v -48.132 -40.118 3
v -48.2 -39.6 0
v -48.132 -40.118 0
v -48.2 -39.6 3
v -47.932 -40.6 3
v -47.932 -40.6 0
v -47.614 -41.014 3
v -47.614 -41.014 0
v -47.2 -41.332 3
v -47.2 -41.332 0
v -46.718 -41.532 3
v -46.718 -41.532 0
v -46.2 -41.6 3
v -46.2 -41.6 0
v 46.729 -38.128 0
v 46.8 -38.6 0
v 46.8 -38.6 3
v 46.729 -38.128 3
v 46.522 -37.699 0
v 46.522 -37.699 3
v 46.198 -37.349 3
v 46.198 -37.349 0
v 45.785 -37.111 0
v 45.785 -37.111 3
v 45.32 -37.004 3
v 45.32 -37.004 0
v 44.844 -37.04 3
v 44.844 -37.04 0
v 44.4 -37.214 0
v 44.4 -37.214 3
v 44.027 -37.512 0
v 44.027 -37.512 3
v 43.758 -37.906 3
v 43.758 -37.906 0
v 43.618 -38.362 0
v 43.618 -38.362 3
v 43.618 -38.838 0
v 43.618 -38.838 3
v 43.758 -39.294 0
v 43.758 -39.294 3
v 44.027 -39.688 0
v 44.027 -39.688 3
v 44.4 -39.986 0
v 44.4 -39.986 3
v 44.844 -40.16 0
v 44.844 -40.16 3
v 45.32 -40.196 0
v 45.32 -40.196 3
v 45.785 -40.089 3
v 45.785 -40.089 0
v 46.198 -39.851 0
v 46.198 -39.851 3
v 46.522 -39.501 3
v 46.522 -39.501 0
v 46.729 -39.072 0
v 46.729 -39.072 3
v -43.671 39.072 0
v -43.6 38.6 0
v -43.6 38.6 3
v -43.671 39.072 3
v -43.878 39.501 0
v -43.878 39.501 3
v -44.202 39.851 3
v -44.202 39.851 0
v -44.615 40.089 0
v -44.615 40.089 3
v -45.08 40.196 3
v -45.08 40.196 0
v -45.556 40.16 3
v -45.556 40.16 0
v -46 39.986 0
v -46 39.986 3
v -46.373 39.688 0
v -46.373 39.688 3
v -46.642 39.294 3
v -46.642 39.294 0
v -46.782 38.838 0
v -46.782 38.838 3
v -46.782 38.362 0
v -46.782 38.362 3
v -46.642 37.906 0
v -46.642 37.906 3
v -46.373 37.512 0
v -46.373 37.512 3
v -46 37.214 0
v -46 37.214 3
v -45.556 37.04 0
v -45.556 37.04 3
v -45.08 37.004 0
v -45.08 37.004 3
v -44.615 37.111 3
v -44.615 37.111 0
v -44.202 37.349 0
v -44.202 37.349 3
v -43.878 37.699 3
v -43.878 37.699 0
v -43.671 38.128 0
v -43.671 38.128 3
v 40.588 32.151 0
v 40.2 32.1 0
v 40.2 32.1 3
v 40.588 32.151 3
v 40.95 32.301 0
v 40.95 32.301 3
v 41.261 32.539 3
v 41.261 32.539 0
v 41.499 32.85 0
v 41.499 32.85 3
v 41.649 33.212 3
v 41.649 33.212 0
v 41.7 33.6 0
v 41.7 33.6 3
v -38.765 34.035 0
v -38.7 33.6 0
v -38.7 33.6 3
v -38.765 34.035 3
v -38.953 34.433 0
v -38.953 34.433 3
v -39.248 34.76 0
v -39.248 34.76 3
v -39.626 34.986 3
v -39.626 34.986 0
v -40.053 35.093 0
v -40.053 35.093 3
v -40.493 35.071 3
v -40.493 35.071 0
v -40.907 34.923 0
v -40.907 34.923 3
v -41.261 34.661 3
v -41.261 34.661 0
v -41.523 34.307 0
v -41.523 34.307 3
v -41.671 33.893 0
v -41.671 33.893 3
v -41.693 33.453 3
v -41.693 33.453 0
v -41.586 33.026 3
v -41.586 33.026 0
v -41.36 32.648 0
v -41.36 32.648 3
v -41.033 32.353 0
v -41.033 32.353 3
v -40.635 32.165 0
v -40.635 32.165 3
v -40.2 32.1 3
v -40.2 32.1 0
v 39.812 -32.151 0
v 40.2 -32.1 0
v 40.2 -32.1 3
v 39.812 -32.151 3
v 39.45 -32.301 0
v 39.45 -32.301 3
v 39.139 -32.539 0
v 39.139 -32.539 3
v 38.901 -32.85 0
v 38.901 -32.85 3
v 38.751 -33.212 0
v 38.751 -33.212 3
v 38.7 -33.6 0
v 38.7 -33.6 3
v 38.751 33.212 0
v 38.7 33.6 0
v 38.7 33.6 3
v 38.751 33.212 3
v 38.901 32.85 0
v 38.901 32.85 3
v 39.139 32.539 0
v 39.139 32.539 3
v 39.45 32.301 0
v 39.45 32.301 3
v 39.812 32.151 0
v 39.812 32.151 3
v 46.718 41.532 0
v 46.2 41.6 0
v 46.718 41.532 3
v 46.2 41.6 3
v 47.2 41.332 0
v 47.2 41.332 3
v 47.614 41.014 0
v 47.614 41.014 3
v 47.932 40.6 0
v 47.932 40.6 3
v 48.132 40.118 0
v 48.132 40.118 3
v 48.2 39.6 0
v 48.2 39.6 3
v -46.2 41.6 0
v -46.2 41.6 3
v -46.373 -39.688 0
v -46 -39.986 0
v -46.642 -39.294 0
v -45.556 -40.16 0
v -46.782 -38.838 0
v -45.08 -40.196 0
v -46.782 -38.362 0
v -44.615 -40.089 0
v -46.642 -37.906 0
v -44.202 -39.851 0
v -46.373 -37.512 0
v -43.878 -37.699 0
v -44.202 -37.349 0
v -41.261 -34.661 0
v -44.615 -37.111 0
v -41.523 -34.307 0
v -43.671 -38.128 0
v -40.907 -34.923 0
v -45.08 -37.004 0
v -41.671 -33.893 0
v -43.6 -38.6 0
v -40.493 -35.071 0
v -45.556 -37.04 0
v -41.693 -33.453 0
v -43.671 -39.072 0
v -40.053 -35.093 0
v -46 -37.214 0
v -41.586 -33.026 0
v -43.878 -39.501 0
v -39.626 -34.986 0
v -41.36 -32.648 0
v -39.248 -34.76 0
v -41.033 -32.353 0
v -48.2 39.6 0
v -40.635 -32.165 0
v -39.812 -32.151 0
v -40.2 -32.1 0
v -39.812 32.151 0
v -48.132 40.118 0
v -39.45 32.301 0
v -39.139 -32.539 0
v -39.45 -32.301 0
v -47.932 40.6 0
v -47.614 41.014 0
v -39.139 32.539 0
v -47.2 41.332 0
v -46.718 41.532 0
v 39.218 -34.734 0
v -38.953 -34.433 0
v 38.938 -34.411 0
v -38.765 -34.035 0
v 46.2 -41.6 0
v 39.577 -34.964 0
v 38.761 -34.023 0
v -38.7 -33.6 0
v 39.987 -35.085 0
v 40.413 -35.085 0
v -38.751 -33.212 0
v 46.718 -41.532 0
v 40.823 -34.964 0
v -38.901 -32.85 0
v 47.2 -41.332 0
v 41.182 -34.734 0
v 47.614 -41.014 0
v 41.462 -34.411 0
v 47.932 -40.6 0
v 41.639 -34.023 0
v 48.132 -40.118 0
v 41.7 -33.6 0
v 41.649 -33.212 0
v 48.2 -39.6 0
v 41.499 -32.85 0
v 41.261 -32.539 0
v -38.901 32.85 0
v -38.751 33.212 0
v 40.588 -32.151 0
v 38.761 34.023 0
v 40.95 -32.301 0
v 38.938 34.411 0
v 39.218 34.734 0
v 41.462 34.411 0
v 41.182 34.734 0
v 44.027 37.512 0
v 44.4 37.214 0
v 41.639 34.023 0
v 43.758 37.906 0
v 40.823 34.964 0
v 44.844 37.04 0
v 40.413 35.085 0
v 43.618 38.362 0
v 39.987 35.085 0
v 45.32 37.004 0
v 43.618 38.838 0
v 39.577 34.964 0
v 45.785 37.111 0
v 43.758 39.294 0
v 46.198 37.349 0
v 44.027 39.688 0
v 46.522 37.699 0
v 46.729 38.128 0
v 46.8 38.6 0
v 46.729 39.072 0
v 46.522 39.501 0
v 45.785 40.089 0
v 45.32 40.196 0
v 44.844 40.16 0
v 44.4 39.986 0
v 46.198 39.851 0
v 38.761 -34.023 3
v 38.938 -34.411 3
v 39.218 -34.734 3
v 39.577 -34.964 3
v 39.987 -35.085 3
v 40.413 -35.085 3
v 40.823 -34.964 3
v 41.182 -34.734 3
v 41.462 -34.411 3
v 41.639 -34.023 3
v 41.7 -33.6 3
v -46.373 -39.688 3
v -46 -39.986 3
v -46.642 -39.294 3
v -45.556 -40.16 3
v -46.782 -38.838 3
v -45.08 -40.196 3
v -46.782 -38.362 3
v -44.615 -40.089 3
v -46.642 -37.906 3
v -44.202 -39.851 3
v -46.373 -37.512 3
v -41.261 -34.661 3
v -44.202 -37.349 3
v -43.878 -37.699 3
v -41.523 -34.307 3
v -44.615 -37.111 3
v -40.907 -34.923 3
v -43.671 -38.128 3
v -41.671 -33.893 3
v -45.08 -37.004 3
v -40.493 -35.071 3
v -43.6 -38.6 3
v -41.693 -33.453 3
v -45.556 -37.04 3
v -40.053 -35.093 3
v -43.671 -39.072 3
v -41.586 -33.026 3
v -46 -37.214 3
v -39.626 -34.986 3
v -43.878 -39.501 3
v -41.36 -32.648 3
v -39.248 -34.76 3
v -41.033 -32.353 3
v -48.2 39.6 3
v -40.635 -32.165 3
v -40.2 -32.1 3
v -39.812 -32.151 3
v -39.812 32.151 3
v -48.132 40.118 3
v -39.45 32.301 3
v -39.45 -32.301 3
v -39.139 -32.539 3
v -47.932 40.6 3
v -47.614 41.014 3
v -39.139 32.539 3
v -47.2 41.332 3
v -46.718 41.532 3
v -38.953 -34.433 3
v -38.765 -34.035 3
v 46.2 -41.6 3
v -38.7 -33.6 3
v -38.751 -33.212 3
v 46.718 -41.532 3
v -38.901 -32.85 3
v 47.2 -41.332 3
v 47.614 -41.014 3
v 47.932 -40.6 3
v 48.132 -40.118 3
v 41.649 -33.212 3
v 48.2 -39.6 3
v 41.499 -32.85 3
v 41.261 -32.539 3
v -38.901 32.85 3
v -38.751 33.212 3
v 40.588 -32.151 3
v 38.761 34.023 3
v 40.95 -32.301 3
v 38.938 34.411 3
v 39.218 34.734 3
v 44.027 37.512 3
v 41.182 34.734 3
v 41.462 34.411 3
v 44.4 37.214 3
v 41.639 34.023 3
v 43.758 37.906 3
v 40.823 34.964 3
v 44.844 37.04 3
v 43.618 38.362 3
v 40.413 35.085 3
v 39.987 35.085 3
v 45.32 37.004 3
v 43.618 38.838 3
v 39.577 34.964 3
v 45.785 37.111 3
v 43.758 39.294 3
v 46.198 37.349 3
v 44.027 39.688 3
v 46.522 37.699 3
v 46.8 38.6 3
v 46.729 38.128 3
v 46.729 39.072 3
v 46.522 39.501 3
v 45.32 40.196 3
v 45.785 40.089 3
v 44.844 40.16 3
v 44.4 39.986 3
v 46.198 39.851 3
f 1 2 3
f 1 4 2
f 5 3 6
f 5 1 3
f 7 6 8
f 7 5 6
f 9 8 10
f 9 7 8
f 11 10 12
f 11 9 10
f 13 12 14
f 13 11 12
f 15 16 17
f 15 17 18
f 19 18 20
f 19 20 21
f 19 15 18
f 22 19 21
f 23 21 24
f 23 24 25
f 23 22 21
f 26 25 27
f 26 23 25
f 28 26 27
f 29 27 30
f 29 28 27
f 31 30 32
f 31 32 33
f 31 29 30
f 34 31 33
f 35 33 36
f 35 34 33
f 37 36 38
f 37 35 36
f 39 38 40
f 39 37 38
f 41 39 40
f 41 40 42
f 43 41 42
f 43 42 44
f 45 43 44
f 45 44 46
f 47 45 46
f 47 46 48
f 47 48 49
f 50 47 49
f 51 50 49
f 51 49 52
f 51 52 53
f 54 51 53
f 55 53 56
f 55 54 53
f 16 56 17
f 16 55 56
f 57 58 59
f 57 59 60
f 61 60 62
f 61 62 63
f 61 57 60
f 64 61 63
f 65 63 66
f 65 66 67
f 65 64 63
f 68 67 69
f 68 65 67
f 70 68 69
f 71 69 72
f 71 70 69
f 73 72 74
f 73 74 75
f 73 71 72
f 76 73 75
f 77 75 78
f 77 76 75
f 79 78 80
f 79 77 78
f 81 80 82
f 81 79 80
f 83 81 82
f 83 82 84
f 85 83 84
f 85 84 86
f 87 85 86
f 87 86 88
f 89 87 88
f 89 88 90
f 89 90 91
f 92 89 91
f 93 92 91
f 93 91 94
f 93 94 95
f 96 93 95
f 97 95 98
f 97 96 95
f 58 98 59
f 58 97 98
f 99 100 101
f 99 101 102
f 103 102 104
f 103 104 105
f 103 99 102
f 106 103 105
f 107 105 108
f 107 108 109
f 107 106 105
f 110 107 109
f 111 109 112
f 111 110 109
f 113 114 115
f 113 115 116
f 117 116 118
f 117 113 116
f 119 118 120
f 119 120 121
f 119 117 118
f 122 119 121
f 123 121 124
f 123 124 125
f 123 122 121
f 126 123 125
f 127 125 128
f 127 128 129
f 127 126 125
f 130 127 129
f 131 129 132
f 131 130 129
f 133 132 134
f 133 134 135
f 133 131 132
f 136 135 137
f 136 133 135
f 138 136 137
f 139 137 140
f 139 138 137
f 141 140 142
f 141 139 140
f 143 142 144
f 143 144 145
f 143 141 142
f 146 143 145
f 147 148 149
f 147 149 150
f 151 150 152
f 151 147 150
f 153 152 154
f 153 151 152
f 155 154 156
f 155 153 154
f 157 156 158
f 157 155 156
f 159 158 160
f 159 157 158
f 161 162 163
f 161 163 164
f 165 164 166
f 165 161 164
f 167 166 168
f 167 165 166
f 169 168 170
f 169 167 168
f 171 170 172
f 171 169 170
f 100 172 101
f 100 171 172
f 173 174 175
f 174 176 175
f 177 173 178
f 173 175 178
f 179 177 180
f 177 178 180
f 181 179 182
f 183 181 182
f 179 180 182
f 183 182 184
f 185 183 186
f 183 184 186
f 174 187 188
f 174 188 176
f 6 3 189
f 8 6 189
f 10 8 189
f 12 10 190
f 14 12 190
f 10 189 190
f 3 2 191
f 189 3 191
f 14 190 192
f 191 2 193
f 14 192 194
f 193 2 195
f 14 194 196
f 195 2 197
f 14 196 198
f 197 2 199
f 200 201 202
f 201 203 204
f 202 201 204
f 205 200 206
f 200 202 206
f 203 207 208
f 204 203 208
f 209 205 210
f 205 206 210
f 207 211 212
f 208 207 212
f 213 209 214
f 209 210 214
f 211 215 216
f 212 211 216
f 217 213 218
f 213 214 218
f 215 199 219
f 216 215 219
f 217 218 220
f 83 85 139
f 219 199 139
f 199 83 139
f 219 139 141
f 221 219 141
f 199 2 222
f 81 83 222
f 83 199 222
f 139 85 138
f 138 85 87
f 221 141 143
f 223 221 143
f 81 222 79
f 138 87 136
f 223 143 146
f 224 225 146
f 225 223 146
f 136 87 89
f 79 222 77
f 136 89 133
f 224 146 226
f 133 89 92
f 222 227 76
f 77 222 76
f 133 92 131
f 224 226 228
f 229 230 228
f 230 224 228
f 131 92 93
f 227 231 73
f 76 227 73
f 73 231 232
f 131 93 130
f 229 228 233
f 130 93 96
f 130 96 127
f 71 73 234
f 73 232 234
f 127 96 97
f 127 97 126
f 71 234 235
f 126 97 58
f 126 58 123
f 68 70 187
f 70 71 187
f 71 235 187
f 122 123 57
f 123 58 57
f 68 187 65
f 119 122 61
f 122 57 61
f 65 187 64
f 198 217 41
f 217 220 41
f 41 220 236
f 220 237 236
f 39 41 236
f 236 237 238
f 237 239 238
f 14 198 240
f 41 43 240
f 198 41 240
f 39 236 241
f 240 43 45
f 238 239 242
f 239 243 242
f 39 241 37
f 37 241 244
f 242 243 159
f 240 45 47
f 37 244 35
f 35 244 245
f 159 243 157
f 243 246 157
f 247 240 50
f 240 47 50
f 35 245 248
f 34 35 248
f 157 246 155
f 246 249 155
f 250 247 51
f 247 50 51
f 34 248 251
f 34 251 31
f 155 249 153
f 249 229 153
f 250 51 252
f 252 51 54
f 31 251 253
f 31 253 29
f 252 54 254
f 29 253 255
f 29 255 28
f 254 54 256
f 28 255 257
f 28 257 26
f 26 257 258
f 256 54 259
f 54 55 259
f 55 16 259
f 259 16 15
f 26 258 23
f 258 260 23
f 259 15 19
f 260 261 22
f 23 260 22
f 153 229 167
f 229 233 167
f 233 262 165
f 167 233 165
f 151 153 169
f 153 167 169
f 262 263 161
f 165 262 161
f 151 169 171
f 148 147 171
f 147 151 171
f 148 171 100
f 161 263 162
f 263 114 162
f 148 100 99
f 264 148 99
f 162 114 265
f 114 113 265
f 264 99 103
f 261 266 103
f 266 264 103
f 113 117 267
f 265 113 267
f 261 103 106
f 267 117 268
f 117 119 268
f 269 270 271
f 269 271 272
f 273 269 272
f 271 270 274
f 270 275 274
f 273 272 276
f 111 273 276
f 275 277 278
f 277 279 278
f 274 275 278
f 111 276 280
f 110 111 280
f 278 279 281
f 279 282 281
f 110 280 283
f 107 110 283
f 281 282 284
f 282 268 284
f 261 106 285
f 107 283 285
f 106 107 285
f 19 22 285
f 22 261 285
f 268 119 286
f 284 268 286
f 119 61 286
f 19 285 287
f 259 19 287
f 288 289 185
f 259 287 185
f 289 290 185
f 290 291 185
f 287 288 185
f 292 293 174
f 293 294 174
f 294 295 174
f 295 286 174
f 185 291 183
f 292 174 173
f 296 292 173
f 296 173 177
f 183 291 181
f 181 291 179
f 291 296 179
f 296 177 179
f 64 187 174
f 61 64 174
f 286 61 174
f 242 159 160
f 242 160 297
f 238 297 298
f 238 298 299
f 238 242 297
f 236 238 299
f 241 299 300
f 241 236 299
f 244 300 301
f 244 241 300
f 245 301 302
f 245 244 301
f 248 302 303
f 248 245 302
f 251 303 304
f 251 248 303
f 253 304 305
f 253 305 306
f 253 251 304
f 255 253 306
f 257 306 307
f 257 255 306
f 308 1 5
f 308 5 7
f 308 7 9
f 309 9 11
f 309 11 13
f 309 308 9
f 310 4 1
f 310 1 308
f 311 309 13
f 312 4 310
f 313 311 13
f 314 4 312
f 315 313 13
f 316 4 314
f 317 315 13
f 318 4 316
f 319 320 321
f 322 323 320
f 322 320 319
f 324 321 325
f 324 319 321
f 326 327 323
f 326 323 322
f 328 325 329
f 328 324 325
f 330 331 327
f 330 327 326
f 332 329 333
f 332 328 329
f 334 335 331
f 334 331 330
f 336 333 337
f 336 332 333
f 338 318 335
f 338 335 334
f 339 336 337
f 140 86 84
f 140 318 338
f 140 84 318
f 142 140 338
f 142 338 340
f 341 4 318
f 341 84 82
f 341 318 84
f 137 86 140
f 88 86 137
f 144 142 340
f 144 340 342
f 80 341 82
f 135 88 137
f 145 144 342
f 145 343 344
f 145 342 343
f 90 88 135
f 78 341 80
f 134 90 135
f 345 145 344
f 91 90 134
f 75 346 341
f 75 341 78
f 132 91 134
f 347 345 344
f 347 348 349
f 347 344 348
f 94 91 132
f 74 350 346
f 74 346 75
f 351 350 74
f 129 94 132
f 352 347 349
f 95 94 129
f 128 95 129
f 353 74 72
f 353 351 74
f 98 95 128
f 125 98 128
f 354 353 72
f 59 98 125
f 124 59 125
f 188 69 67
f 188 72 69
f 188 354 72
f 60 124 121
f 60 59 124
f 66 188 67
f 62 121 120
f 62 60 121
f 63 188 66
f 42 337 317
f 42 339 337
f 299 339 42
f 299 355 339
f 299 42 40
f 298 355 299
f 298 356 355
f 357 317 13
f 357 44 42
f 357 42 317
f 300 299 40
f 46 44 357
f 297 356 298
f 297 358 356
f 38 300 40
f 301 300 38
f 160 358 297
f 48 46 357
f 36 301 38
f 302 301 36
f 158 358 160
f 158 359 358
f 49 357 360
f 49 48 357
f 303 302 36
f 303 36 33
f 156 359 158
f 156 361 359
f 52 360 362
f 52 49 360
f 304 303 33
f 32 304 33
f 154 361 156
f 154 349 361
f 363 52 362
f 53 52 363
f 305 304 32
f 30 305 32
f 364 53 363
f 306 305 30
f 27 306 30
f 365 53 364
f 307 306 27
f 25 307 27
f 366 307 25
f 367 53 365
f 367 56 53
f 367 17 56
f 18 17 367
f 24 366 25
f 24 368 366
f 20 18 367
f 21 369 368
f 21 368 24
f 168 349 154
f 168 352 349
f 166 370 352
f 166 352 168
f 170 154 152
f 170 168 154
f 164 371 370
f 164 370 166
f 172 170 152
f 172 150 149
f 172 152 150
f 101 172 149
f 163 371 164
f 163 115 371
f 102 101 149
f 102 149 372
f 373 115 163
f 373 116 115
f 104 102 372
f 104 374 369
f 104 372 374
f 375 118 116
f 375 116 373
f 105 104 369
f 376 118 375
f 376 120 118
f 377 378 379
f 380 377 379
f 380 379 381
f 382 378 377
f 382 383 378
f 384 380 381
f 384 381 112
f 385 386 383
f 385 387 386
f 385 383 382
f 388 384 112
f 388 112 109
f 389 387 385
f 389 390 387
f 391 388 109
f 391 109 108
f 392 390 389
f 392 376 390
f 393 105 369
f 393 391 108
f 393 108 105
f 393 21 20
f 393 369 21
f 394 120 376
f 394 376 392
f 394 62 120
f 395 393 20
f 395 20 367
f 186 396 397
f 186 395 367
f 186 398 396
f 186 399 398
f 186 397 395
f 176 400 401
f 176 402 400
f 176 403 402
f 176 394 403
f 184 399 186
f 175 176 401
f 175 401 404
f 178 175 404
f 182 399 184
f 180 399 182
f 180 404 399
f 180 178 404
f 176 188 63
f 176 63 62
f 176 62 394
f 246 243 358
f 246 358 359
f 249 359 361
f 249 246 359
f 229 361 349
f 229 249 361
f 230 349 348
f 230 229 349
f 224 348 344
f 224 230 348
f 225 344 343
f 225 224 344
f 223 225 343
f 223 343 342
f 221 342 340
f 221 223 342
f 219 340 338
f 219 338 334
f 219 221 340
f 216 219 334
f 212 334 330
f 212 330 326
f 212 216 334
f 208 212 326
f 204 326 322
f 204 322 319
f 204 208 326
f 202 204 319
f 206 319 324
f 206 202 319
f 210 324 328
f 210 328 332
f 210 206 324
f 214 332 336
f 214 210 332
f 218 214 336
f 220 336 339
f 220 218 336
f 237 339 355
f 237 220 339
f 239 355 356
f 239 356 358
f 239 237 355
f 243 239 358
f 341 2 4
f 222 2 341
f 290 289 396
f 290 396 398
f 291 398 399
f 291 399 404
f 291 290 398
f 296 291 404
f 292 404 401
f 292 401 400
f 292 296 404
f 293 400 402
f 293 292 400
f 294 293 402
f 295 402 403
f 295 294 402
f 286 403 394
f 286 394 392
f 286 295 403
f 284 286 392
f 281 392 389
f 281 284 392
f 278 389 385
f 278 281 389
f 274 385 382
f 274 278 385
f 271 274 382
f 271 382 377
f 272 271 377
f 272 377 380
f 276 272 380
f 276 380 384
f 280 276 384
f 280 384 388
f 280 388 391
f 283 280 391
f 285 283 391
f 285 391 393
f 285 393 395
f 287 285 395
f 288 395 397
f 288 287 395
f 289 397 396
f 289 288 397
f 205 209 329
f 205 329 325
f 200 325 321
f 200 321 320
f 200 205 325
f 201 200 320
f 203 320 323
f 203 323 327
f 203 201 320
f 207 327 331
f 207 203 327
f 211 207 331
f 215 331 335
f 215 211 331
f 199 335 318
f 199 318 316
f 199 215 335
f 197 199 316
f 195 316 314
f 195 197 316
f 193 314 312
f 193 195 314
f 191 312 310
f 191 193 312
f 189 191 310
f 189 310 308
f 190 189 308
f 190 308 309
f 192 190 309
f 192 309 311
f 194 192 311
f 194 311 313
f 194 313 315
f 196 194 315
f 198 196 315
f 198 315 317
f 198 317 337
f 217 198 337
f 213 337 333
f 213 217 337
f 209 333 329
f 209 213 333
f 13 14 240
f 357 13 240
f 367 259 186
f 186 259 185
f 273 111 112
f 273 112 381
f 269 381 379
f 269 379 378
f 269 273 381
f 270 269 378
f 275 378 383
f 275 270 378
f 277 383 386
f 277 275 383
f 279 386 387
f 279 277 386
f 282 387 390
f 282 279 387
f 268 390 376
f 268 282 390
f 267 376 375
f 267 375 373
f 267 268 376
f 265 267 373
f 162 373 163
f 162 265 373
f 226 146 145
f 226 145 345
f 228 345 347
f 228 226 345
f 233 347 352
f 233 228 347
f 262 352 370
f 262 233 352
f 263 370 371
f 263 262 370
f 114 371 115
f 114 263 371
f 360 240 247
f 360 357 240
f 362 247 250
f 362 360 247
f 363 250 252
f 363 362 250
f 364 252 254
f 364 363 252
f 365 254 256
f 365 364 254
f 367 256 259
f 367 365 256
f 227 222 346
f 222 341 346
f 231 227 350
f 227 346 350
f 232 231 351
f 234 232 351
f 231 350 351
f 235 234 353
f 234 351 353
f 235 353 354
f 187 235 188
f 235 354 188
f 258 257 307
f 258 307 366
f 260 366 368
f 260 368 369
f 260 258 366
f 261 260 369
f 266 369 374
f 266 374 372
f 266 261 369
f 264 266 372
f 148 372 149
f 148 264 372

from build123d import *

# Parameters (mm, degrees)
SKETCH_1_W          = 96.4
SKETCH_1_H          = 83.2
SKETCH_1_R          = 1.6
EXTRUDE_1_DEPTH     = 3
FILLET_1_R          = 2
SKETCH_1_3_R        = 1.5
CUT_EXTRUDE_3_DEPTH = 3


with BuildPart() as part:
    # 草图1 → 凸台-拉伸1 (new body)
    with BuildSketch(Plane.XY):
        Rectangle(SKETCH_1_W, SKETCH_1_H)
        with Locations((-45.2, -38.6)):
            Circle(SKETCH_1_R, mode=Mode.SUBTRACT)
        with Locations((45.2, -38.6)):
            Circle(SKETCH_1_R, mode=Mode.SUBTRACT)
        with Locations((45.2, 38.6)):
            Circle(SKETCH_1_R, mode=Mode.SUBTRACT)
        with Locations((-45.2, 38.6)):
            Circle(SKETCH_1_R, mode=Mode.SUBTRACT)
    extrude(amount=EXTRUDE_1_DEPTH)

    # 圆角1
    fillet_1_edges = [part.edges().sort_by_distance(p)[0] for p in [
        (48.2, -41.6, 1.5),
        (-48.2, -41.6, 1.5),
        (-48.2, 41.6, 1.5),
        (48.2, 41.6, 1.5),
    ]]
    fillet(fillet_1_edges, radius=FILLET_1_R)

    # 草图1<3> → 切除-拉伸3 (cut)
    with BuildSketch(Plane.XY):
        with Locations((-40.2, 33.6)):
            Circle(SKETCH_1_3_R)
        with Locations((40.2, 33.6)):
            Circle(SKETCH_1_3_R)
        with Locations((-40.2, -33.6)):
            Circle(SKETCH_1_3_R)
        with Locations((40.2, -33.6)):
            Circle(SKETCH_1_3_R)
    extrude(amount=CUT_EXTRUDE_3_DEPTH, mode=Mode.SUBTRACT)


solid = part.part
